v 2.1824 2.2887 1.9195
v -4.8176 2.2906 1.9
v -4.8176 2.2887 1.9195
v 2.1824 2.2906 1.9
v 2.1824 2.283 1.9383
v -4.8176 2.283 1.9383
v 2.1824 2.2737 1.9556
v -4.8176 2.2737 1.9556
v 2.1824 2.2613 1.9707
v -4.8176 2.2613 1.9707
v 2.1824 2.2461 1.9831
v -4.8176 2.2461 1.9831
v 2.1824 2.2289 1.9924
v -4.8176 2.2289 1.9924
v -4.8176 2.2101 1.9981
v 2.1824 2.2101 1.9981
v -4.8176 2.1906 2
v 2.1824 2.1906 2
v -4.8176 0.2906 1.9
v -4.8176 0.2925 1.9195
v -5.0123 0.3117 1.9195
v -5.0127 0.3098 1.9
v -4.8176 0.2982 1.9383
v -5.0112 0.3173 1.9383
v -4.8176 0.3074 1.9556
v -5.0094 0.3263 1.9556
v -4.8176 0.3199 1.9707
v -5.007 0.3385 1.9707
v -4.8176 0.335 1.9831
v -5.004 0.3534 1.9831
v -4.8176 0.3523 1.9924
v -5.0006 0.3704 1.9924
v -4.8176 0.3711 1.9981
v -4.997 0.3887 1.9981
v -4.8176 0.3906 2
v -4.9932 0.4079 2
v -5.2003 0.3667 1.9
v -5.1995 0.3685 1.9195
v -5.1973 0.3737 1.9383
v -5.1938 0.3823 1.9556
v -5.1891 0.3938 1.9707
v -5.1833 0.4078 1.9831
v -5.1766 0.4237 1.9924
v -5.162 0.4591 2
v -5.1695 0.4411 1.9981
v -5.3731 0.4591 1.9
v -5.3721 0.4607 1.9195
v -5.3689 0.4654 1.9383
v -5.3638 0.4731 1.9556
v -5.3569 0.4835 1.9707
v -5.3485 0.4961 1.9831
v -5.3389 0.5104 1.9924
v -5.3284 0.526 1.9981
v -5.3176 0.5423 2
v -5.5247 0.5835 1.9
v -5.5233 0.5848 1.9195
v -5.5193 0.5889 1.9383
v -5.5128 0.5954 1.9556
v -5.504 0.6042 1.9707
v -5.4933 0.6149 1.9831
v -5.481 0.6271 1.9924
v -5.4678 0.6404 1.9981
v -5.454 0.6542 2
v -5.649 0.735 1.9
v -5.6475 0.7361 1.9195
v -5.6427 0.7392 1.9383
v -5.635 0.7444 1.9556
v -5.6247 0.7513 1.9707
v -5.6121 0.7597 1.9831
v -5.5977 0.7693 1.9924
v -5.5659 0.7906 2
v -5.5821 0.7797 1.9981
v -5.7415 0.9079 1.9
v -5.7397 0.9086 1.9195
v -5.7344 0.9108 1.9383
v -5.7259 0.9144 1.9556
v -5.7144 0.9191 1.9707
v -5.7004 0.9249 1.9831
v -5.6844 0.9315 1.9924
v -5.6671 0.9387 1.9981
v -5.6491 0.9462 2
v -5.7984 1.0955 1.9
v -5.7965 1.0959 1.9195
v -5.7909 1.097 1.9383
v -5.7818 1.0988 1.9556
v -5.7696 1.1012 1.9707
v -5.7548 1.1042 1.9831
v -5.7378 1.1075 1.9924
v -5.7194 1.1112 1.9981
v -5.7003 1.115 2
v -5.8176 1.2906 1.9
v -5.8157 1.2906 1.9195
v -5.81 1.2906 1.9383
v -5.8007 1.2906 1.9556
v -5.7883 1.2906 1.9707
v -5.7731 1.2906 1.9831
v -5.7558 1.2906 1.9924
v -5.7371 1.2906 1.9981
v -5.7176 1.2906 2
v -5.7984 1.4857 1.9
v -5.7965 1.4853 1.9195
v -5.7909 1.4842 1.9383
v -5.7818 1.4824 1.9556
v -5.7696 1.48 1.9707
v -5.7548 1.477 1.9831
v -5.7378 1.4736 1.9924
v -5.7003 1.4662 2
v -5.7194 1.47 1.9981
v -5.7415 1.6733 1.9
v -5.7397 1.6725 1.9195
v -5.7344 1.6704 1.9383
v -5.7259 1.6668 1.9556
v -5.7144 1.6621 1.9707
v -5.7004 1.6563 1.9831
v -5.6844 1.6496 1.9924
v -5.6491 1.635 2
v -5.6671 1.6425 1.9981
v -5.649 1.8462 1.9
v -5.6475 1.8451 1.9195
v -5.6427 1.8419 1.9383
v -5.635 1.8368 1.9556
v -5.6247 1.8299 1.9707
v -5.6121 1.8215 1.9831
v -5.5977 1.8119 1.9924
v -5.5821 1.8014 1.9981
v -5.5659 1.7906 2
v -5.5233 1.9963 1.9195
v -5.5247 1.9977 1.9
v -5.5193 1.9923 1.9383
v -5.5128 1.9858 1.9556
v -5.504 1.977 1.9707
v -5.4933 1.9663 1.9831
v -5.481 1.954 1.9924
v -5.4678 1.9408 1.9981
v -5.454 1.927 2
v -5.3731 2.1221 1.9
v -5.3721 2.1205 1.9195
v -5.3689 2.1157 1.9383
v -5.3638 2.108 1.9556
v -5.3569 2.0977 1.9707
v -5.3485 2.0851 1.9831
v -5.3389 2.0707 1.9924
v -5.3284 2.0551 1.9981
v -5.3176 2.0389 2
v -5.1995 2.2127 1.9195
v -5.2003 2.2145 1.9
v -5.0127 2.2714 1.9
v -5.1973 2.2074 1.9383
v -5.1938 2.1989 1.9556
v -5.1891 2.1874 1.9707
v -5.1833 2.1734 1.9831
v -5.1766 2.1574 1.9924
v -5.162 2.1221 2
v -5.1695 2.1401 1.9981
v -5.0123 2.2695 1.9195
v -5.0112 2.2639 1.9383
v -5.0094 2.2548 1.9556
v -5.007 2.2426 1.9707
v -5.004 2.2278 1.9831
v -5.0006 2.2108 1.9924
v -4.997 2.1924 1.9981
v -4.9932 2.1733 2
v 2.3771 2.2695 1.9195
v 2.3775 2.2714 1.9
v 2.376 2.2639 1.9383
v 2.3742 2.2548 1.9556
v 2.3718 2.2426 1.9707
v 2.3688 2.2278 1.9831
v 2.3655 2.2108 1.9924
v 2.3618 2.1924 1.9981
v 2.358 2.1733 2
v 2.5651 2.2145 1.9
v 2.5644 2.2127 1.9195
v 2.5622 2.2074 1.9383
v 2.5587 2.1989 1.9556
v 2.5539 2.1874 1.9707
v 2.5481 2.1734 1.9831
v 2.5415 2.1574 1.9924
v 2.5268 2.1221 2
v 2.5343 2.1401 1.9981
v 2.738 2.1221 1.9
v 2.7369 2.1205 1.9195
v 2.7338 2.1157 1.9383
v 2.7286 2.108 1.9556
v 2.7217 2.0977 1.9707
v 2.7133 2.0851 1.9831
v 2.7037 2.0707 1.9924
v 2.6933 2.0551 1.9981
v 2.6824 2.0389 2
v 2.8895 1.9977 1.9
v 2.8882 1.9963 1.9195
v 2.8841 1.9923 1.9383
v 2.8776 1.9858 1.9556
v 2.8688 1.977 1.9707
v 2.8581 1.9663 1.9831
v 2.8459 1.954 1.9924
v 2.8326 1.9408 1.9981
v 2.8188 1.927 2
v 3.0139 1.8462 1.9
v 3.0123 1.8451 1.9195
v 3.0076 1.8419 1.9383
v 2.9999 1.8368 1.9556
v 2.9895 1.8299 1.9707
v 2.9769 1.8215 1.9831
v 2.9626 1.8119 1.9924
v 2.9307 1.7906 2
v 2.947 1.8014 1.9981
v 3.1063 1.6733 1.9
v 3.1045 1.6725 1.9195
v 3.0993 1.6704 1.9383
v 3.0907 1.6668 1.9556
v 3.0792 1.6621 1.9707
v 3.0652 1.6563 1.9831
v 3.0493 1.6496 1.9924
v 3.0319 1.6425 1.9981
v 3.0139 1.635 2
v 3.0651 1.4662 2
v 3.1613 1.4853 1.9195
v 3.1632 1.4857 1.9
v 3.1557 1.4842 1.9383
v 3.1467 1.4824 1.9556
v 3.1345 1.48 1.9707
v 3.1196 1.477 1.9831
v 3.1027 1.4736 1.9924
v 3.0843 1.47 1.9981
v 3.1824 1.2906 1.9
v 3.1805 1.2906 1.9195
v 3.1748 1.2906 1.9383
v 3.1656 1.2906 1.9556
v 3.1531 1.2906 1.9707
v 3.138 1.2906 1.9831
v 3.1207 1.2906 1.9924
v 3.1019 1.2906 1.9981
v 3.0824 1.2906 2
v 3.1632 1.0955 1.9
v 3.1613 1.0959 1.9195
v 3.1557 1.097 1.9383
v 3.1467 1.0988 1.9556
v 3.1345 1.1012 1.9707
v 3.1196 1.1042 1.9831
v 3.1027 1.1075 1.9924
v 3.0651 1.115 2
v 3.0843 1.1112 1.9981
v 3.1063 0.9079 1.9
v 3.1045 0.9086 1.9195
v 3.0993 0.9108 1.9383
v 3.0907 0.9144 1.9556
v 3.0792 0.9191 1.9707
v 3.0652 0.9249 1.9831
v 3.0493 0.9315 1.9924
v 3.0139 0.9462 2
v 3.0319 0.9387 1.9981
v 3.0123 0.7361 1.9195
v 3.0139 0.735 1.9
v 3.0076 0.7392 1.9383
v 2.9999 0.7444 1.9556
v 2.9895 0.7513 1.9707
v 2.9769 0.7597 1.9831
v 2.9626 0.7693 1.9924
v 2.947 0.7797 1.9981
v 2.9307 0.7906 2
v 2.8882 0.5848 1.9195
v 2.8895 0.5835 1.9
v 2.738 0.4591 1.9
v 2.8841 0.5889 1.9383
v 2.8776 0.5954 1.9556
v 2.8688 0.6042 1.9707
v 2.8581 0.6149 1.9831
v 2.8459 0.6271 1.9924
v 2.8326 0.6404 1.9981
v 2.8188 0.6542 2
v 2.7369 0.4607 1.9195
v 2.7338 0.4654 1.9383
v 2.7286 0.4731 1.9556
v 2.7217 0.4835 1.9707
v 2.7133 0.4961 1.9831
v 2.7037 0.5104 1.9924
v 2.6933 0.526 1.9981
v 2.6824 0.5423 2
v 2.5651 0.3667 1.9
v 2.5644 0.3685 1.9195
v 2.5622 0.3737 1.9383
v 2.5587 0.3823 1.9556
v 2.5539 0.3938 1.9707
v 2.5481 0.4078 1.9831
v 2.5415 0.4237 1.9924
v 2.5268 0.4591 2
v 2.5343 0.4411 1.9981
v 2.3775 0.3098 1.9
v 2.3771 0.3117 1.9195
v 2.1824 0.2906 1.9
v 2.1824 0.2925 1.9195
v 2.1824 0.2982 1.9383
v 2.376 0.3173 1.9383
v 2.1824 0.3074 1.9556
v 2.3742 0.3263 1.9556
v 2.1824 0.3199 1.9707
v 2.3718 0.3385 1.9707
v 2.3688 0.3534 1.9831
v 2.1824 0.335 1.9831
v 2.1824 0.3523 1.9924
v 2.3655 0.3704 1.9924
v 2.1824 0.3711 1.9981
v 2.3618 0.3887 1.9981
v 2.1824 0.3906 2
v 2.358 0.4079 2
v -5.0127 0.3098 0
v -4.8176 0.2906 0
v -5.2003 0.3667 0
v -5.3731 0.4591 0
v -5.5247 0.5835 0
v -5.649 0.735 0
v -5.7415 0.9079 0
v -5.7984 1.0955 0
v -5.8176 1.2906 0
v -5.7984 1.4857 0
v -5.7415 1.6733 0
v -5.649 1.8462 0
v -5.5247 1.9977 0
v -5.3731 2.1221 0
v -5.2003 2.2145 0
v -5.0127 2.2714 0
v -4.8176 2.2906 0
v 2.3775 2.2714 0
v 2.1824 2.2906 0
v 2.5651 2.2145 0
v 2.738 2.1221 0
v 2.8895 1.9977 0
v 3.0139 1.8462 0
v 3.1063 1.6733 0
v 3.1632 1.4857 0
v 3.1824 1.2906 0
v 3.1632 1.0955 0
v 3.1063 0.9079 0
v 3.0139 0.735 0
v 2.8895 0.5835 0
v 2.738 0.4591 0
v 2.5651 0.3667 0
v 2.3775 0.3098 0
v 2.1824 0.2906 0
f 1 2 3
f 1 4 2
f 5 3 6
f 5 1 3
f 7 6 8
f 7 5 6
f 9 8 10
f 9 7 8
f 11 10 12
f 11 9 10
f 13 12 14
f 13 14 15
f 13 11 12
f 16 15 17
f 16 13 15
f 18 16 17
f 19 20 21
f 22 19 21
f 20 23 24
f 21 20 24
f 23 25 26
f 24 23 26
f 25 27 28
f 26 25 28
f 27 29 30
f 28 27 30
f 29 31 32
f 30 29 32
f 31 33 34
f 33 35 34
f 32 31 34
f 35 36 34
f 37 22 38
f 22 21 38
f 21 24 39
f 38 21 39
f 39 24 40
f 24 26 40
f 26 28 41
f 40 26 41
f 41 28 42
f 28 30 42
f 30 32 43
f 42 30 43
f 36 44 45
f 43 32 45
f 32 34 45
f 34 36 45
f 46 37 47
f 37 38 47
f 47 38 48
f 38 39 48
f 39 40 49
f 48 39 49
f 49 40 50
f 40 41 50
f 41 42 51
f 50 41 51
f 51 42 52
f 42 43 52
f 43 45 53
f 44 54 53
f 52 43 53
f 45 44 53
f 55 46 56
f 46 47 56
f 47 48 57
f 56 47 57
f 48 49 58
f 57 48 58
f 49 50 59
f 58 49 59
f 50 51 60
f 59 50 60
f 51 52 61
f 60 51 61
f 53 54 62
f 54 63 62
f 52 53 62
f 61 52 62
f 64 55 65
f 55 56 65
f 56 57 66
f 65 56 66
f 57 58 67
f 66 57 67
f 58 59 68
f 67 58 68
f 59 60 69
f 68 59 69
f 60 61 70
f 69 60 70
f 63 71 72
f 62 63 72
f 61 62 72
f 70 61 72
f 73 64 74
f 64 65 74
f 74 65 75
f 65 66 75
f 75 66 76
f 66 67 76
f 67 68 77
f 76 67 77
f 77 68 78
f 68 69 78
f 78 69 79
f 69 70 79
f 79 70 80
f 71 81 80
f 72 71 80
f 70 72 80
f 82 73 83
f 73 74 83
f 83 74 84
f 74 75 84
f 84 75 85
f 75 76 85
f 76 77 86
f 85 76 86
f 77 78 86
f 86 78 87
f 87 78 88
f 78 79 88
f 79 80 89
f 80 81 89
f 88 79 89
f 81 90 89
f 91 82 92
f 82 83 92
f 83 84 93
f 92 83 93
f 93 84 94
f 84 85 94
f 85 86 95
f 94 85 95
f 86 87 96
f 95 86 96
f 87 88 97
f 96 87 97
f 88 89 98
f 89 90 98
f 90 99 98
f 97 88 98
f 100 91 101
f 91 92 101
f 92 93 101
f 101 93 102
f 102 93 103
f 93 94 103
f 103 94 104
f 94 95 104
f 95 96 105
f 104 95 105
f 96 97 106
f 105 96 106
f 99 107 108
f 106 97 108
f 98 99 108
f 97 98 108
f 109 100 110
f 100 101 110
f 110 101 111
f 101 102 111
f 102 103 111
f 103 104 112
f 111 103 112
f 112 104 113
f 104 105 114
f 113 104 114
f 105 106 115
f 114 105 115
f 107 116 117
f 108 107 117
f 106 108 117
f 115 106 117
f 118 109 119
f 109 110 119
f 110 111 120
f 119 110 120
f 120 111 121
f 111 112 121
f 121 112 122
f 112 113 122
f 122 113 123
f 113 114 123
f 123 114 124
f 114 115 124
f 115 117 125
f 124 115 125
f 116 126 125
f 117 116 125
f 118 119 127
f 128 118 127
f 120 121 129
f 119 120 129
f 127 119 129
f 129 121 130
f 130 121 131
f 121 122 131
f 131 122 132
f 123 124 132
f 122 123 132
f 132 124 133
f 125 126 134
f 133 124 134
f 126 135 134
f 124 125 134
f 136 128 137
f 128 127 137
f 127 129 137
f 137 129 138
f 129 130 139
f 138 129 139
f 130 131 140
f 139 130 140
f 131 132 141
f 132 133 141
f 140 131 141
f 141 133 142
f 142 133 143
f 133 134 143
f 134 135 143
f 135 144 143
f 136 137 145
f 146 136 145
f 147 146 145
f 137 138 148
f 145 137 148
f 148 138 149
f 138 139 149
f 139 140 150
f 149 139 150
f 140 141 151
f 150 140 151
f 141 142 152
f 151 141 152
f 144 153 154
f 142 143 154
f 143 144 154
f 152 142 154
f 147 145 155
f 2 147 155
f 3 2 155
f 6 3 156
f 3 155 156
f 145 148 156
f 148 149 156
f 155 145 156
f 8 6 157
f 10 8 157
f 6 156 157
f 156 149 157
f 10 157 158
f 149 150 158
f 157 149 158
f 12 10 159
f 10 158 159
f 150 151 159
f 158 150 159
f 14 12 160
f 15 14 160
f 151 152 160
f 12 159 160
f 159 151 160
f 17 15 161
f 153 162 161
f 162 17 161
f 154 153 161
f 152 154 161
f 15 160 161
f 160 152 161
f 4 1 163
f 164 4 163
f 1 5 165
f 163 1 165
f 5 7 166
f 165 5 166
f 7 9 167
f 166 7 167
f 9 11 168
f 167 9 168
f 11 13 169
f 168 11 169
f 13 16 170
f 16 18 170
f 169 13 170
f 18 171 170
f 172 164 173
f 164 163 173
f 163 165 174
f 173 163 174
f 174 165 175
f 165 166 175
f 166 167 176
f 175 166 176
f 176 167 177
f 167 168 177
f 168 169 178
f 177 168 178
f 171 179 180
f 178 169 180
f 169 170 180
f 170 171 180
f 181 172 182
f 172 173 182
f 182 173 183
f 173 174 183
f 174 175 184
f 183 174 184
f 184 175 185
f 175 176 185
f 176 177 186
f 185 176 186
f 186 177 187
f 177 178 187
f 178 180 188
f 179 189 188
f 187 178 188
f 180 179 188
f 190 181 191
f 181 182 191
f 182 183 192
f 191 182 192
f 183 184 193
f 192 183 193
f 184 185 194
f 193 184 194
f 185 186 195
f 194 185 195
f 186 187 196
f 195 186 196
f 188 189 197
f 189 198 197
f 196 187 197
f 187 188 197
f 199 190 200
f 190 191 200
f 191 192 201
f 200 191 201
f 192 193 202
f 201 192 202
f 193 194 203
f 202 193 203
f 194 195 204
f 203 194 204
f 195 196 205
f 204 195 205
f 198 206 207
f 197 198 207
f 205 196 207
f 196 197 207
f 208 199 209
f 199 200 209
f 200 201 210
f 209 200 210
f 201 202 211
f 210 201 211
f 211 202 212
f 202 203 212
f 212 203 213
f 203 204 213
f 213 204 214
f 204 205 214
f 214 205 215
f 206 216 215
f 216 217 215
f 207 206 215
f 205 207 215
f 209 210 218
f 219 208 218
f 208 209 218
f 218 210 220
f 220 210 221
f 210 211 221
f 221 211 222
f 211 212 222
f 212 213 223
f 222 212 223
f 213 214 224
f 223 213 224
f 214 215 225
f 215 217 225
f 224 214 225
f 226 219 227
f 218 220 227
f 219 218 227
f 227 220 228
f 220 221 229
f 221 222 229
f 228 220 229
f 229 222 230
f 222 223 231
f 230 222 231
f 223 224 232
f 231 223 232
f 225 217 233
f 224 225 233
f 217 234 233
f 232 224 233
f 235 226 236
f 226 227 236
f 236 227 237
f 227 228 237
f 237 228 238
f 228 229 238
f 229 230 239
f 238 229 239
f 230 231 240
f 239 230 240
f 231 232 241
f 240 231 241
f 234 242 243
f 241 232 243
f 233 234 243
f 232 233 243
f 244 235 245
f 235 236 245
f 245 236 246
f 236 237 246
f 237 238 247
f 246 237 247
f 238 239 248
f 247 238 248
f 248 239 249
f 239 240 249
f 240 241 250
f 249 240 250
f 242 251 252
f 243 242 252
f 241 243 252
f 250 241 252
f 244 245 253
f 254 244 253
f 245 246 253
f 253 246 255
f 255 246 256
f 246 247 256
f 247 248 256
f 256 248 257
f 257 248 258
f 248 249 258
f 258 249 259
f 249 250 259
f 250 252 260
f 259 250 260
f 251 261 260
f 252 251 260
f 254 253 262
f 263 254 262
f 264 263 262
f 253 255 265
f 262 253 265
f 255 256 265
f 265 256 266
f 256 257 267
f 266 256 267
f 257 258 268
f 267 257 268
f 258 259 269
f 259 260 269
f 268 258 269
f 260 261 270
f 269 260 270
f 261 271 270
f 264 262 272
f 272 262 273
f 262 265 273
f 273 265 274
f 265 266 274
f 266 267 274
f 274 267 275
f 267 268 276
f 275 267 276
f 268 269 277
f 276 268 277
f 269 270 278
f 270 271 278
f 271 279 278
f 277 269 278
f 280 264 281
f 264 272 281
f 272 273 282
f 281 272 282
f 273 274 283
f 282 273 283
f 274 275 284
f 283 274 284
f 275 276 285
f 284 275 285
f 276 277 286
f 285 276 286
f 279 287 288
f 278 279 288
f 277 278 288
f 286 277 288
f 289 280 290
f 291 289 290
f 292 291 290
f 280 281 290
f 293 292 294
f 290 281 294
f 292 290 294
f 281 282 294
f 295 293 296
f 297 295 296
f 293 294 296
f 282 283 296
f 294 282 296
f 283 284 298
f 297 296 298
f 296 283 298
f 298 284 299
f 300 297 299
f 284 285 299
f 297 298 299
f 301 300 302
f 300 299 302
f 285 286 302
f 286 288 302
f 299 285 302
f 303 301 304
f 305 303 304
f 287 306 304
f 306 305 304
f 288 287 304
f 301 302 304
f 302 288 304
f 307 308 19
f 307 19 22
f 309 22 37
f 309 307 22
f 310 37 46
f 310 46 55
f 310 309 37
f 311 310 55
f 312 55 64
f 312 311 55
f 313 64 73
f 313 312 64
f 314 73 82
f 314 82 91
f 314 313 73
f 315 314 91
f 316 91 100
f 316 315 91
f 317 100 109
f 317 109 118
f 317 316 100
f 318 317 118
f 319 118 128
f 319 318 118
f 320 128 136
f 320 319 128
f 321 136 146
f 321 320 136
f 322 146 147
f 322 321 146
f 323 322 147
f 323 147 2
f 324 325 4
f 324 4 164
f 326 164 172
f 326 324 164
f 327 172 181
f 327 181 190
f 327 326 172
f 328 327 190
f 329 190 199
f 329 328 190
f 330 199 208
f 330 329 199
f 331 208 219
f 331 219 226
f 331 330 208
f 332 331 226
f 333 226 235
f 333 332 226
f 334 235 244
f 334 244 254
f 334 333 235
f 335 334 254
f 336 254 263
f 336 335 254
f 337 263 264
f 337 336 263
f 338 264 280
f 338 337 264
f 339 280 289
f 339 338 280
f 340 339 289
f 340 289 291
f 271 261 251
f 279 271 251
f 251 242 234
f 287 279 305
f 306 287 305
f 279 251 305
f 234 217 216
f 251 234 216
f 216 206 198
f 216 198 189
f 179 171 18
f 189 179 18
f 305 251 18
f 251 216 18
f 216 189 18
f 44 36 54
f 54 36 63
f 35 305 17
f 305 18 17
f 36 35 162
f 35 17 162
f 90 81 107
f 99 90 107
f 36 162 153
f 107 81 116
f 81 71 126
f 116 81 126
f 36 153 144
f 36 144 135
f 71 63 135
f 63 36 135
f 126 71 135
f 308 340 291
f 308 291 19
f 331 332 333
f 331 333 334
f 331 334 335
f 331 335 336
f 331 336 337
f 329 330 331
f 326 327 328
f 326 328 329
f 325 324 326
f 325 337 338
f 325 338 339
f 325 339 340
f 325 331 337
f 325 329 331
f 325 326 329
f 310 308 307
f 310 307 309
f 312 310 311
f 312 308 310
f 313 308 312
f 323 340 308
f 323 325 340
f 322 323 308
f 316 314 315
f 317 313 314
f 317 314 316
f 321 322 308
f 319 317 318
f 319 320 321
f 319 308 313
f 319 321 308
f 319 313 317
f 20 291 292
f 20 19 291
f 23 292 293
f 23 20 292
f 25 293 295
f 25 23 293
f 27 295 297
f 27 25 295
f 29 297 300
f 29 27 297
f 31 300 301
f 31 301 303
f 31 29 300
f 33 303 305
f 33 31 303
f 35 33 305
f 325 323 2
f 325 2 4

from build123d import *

# Parameters (mm, degrees)
EXTRUDE_1_DEPTH = 2
FILLET_1_R      = 0.1


with BuildPart() as part:
    # 草图1 → 凸台-拉伸1 (new body)
    with BuildSketch(Plane.XY):
        with BuildLine():
            Line((-4.817578773, 2.290590087), (2.182421227, 2.290590087))
            ThreePointArc((2.182421227, 2.290590087), (3.182421227, 1.290590087), (2.182421227, 0.290590087))
            Line((2.182421227, 0.290590087), (-4.817578773, 0.290590087))
            ThreePointArc((-4.817578773, 0.290590087), (-5.817578773, 1.290590087), (-4.817578773, 2.290590087))
        make_face()
    extrude(amount=EXTRUDE_1_DEPTH)

    # 圆角1
    fillet_1_edges = [part.edges().sort_by_distance(p)[0] for p in [
        (3.182421227, 1.290590087, 2),
        (-1.317578773, 2.290590087, 2),
        (-5.817578773, 1.290590087, 2),
        (-1.317578773, 0.290590087, 2),
    ]]
    fillet(fillet_1_edges, radius=FILLET_1_R)


solid = part.part
